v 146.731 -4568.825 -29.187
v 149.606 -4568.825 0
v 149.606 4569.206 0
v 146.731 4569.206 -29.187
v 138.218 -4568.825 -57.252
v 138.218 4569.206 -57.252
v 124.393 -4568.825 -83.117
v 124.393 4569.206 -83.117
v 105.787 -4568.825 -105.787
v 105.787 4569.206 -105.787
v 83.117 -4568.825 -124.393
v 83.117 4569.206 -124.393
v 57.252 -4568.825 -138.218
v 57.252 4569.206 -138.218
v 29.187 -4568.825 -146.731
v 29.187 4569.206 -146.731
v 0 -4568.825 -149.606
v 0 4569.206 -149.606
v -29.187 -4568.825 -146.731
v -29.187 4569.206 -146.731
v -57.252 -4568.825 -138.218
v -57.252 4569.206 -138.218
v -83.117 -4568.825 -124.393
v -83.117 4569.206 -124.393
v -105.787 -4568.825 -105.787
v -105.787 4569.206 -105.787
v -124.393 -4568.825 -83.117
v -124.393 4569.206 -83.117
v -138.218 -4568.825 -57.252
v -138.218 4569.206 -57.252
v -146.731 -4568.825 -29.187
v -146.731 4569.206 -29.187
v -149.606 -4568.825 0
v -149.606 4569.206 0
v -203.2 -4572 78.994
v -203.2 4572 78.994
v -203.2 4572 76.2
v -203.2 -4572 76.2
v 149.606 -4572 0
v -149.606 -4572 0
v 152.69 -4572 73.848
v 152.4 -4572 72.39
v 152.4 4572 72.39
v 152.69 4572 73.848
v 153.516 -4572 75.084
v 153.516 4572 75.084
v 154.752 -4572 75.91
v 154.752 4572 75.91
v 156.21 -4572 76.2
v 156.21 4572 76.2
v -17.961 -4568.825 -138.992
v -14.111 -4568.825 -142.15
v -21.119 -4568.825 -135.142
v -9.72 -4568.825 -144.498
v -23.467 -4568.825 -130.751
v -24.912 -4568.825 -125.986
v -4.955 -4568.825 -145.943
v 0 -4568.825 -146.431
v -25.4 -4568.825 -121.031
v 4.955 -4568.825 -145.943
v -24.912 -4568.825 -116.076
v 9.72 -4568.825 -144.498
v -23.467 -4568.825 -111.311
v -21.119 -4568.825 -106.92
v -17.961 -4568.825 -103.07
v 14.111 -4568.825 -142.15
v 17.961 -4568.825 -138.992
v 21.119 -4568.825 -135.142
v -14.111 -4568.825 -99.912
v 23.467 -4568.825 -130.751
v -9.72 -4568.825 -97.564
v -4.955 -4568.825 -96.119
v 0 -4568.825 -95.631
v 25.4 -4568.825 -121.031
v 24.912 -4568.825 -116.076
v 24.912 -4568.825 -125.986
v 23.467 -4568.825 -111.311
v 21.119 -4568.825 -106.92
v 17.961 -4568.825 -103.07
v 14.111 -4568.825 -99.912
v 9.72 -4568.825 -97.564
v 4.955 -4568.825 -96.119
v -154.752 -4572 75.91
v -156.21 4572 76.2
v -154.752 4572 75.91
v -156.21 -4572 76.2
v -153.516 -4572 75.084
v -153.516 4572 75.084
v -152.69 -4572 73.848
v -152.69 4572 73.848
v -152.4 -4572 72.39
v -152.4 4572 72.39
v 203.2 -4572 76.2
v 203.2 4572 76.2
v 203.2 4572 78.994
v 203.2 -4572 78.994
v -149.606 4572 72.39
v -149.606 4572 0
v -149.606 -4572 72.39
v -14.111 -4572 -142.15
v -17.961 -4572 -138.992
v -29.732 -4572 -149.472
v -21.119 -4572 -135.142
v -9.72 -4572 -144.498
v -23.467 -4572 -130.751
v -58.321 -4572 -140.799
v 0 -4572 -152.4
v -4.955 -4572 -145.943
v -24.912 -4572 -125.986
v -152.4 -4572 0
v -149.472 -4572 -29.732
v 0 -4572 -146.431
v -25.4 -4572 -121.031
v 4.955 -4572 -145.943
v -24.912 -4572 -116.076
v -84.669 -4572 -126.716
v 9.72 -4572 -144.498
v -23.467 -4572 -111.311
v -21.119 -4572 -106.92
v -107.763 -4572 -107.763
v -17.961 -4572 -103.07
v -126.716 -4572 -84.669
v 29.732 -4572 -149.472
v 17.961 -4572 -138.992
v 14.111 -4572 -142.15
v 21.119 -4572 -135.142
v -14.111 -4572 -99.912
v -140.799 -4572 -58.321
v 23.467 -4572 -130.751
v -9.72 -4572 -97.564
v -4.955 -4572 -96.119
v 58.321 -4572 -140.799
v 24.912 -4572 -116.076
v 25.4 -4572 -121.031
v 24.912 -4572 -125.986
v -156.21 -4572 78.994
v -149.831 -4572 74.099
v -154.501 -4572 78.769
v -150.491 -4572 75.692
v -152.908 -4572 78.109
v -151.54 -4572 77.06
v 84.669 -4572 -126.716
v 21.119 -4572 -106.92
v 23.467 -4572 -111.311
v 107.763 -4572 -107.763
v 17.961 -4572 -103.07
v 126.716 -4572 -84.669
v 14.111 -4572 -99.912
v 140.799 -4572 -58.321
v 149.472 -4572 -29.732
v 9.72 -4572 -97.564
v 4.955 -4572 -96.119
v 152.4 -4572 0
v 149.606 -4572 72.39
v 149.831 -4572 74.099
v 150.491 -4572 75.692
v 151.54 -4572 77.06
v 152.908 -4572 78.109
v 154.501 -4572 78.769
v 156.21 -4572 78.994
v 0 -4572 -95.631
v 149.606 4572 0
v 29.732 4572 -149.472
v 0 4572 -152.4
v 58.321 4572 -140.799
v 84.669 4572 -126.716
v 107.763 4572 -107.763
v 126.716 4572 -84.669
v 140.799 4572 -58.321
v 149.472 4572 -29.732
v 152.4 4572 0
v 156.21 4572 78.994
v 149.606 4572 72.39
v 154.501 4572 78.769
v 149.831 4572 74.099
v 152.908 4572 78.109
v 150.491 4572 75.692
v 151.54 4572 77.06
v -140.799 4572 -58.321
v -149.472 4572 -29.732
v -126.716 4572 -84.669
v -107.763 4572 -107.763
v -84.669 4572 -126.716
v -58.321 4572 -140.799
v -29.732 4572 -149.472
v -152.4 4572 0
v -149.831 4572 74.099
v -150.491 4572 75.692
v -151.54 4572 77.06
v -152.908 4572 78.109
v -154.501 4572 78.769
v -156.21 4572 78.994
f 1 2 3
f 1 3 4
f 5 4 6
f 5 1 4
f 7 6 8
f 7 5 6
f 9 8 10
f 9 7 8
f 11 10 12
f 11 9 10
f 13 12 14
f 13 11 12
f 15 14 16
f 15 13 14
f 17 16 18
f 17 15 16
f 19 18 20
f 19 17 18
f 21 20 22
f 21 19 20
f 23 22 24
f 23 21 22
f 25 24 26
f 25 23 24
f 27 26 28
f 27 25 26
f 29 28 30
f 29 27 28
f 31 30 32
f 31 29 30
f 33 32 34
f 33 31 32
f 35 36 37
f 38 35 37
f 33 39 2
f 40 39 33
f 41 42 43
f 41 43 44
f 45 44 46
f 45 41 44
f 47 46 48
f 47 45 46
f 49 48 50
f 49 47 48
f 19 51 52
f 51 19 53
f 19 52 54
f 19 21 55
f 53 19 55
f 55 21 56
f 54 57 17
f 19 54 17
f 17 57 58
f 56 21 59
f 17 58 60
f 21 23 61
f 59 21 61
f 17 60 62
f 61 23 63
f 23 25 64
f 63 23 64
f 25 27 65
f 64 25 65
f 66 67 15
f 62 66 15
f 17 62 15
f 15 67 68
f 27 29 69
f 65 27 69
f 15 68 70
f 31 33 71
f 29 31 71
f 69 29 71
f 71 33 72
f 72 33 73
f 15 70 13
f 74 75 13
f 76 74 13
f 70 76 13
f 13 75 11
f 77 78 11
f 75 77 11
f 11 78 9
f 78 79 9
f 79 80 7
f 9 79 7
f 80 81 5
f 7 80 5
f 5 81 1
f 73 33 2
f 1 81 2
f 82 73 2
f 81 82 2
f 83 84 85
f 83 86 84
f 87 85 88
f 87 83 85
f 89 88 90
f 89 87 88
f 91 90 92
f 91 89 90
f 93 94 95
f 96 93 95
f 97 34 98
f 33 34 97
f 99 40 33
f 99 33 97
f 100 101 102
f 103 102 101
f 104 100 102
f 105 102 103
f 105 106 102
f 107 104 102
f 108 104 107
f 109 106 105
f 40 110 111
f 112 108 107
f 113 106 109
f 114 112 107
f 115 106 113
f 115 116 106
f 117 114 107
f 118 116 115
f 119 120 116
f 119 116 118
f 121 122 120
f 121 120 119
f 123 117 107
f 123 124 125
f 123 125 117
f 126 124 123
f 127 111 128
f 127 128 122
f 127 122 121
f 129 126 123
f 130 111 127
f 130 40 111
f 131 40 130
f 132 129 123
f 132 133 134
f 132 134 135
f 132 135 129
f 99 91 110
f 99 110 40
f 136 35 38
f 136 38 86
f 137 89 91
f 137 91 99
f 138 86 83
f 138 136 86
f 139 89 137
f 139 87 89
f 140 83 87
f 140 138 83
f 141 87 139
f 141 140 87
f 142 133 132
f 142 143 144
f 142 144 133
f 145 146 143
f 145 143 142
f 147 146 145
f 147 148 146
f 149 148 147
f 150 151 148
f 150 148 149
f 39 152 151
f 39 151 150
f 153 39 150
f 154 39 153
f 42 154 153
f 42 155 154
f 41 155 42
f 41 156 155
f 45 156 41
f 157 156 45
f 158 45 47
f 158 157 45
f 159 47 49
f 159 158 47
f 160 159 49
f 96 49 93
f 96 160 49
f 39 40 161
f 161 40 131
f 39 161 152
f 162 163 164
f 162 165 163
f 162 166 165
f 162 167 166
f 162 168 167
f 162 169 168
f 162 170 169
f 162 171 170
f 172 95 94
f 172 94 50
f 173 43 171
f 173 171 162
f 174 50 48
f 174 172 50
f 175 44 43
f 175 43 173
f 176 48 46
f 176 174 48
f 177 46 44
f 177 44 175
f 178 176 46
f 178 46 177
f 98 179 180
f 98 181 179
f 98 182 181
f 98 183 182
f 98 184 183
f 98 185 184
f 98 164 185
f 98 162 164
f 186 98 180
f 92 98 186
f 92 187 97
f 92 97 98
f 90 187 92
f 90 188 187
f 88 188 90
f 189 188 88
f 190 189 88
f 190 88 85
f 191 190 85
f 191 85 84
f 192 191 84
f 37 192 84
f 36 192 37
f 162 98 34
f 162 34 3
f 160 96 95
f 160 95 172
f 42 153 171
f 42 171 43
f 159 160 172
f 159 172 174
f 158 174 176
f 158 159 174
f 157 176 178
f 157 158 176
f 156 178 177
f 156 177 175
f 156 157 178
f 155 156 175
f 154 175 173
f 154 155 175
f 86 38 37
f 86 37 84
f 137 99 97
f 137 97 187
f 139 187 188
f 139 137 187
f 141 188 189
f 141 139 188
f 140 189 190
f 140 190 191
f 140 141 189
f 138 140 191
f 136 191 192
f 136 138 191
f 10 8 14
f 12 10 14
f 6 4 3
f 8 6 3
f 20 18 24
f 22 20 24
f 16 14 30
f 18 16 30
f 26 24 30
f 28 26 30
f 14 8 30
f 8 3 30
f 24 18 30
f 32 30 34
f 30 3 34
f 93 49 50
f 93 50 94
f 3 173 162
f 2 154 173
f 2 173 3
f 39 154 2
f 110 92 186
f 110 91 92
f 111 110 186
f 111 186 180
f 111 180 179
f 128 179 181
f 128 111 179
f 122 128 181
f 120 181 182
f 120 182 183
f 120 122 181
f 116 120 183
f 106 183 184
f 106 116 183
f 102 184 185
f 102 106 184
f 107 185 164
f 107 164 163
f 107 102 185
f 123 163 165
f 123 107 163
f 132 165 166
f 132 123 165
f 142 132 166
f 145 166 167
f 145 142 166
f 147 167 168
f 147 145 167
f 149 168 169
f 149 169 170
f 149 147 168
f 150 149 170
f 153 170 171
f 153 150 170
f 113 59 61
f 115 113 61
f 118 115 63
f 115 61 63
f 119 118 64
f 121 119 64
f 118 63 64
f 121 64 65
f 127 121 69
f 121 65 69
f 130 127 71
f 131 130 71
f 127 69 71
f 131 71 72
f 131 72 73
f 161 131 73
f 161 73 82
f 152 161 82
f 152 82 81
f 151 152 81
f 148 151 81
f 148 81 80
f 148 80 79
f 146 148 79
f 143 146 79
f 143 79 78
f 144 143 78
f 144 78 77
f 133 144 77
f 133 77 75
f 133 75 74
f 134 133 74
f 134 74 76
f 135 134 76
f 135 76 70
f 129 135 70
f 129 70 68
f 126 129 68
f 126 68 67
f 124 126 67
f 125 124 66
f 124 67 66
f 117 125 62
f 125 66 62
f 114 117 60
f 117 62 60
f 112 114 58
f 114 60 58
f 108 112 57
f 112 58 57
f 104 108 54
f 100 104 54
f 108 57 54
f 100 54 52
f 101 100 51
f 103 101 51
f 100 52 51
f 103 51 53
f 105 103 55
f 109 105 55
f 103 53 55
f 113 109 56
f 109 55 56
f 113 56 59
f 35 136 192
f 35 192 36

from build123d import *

# Parameters (mm, degrees)
F1_DEPTH = 4572
F3_DEPTH = 3.175
F5_DEPTH = 2.794
F6_D     = 50.8
F6_DEPTH = 12.7


with BuildPart() as f1:
    # F0 (on Front) → F1 (new body, symmetric)
    with BuildSketch(Plane.XZ):
        with BuildLine():
            ThreePointArc((-152.4, 0), (0, -152.4), (152.4, 0))
            Line((152.4, 0), (152.4, 72.39))
            ThreePointArc((152.4, 72.39), (153.515923, 75.084077), (156.21, 76.2))
            Line((156.21, 76.2), (203.2, 76.2))
            Line((203.2, 76.2), (203.2, 78.994))
            Line((203.2, 78.994), (156.21, 78.994))
            ThreePointArc((156.21, 78.994), (151.540267, 77.059733), (149.606, 72.39))
            Line((149.606, 72.39), (149.606, 0))
            ThreePointArc((149.606, 0), (0, -149.606), (-149.606, 0))
            Line((-149.606, 0), (-149.606, 72.39))
            ThreePointArc((-149.606, 72.39), (-151.540267, 77.059733), (-156.21, 78.994))
            Line((-156.21, 78.994), (-203.2, 78.994))
            Line((-203.2, 78.994), (-203.2, 76.2))
            Line((-203.2, 76.2), (-156.21, 76.2))
            ThreePointArc((-156.21, 76.2), (-153.515923, 75.084077), (-152.4, 72.39))
            Line((-152.4, 72.39), (-152.4, 0))
        make_face()
    extrude(amount=F1_DEPTH, both=True)

    # F2 (on face) → F3 (join)
    with BuildSketch(Plane.XZ.offset(4572)):
        with BuildLine():
            Line((152.4, 0), (-152.4, 0))
            ThreePointArc((-152.4, 0), (0, -152.4), (152.4, 0))
        make_face()
    extrude(amount=-F3_DEPTH)

    # F4 (on face) → F5 (join)
    with BuildSketch(Plane(origin=(0, 4572, 0), x_dir=(-1, 0, 0), z_dir=(0, 1, 0))):
        with BuildLine():
            ThreePointArc((-149.606, 0), (0, -149.606), (149.606, 0))
            Line((149.606, 0), (-149.606, 0))
        make_face()
    extrude(amount=-F5_DEPTH)

    # F6
    with Locations(Plane.XZ.offset(4572)):
        with Locations((0, -121.031)):
            Hole(F6_D / 2, depth=F6_DEPTH)


solid = f1.part
